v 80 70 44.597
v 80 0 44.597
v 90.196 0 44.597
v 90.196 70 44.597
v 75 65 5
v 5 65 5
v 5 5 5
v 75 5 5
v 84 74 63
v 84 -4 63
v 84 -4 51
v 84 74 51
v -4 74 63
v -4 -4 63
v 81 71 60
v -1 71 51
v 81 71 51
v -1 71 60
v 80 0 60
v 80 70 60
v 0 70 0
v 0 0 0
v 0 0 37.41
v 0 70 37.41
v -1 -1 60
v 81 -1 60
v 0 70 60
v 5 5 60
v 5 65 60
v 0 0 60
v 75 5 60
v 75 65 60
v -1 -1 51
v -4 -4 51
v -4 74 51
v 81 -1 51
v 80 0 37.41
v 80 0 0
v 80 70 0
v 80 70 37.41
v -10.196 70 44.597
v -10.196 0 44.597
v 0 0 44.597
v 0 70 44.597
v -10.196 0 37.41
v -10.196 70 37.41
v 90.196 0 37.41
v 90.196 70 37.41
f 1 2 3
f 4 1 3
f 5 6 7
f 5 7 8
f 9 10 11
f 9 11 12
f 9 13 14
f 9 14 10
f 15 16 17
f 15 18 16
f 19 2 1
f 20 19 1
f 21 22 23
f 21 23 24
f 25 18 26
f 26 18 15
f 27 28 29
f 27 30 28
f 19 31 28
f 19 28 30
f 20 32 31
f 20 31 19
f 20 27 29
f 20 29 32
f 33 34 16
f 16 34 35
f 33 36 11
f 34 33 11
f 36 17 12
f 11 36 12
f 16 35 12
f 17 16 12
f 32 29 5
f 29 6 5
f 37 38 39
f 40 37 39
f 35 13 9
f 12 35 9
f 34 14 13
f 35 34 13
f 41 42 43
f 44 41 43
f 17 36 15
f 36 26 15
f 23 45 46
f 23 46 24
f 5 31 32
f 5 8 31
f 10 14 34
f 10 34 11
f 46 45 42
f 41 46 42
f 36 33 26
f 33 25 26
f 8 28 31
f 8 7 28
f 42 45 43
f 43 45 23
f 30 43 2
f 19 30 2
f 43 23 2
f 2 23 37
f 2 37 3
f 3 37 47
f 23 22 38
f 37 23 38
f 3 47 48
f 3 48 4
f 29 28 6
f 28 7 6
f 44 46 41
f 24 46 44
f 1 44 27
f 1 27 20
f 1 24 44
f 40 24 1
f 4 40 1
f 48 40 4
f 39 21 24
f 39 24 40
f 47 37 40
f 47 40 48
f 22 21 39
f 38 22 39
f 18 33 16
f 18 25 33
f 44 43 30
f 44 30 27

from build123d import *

# Parameters (mm, degrees)
F0_W     = 80
F0_H     = 70
F1_DEPTH = 60
F2_T     = -5
F4_W     = 88
F4_H     = 78
F5_DEPTH = 12
F6_T     = -3
F7_W     = 10.1958429441
F7_H     = 7.1875955909
F8_DEPTH = 70


with BuildPart() as f1:
    # F0 (on Top) → F1 (new body)
    with BuildSketch(Plane.XY):
        with Locations((40, 35)):
            Rectangle(F0_W, F0_H)
    extrude(amount=F1_DEPTH)

    # F2
    f2_openings = [f1.faces().sort_by_distance(p)[0] for p in [
        (40, 35, 60),
    ]]
    offset(amount=F2_T, openings=f2_openings)

    # F7 (on face) → F8 (join, through all)
    with BuildSketch(Plane.XZ):
        with Locations((-5.097921472, 41.0034256056)):
            Rectangle(F7_W, F7_H)
        with Locations((85.097921472, 41.0034256056)):
            Rectangle(F7_W, F7_H)
    extrude(amount=-F8_DEPTH)


with BuildPart() as f5:
    # F4 (on offset) → F5 (new body)
    with BuildSketch(Plane.XY.offset(63)):
        with Locations((40, 35)):
            Rectangle(F4_W, F4_H)
    extrude(amount=-F5_DEPTH)

    # F6
    f6_openings = [f5.faces().sort_by_distance(p)[0] for p in [
        (40, 35, 51),
    ]]
    offset(amount=F6_T, openings=f6_openings)


solid = Compound([f1.part, f5.part])
